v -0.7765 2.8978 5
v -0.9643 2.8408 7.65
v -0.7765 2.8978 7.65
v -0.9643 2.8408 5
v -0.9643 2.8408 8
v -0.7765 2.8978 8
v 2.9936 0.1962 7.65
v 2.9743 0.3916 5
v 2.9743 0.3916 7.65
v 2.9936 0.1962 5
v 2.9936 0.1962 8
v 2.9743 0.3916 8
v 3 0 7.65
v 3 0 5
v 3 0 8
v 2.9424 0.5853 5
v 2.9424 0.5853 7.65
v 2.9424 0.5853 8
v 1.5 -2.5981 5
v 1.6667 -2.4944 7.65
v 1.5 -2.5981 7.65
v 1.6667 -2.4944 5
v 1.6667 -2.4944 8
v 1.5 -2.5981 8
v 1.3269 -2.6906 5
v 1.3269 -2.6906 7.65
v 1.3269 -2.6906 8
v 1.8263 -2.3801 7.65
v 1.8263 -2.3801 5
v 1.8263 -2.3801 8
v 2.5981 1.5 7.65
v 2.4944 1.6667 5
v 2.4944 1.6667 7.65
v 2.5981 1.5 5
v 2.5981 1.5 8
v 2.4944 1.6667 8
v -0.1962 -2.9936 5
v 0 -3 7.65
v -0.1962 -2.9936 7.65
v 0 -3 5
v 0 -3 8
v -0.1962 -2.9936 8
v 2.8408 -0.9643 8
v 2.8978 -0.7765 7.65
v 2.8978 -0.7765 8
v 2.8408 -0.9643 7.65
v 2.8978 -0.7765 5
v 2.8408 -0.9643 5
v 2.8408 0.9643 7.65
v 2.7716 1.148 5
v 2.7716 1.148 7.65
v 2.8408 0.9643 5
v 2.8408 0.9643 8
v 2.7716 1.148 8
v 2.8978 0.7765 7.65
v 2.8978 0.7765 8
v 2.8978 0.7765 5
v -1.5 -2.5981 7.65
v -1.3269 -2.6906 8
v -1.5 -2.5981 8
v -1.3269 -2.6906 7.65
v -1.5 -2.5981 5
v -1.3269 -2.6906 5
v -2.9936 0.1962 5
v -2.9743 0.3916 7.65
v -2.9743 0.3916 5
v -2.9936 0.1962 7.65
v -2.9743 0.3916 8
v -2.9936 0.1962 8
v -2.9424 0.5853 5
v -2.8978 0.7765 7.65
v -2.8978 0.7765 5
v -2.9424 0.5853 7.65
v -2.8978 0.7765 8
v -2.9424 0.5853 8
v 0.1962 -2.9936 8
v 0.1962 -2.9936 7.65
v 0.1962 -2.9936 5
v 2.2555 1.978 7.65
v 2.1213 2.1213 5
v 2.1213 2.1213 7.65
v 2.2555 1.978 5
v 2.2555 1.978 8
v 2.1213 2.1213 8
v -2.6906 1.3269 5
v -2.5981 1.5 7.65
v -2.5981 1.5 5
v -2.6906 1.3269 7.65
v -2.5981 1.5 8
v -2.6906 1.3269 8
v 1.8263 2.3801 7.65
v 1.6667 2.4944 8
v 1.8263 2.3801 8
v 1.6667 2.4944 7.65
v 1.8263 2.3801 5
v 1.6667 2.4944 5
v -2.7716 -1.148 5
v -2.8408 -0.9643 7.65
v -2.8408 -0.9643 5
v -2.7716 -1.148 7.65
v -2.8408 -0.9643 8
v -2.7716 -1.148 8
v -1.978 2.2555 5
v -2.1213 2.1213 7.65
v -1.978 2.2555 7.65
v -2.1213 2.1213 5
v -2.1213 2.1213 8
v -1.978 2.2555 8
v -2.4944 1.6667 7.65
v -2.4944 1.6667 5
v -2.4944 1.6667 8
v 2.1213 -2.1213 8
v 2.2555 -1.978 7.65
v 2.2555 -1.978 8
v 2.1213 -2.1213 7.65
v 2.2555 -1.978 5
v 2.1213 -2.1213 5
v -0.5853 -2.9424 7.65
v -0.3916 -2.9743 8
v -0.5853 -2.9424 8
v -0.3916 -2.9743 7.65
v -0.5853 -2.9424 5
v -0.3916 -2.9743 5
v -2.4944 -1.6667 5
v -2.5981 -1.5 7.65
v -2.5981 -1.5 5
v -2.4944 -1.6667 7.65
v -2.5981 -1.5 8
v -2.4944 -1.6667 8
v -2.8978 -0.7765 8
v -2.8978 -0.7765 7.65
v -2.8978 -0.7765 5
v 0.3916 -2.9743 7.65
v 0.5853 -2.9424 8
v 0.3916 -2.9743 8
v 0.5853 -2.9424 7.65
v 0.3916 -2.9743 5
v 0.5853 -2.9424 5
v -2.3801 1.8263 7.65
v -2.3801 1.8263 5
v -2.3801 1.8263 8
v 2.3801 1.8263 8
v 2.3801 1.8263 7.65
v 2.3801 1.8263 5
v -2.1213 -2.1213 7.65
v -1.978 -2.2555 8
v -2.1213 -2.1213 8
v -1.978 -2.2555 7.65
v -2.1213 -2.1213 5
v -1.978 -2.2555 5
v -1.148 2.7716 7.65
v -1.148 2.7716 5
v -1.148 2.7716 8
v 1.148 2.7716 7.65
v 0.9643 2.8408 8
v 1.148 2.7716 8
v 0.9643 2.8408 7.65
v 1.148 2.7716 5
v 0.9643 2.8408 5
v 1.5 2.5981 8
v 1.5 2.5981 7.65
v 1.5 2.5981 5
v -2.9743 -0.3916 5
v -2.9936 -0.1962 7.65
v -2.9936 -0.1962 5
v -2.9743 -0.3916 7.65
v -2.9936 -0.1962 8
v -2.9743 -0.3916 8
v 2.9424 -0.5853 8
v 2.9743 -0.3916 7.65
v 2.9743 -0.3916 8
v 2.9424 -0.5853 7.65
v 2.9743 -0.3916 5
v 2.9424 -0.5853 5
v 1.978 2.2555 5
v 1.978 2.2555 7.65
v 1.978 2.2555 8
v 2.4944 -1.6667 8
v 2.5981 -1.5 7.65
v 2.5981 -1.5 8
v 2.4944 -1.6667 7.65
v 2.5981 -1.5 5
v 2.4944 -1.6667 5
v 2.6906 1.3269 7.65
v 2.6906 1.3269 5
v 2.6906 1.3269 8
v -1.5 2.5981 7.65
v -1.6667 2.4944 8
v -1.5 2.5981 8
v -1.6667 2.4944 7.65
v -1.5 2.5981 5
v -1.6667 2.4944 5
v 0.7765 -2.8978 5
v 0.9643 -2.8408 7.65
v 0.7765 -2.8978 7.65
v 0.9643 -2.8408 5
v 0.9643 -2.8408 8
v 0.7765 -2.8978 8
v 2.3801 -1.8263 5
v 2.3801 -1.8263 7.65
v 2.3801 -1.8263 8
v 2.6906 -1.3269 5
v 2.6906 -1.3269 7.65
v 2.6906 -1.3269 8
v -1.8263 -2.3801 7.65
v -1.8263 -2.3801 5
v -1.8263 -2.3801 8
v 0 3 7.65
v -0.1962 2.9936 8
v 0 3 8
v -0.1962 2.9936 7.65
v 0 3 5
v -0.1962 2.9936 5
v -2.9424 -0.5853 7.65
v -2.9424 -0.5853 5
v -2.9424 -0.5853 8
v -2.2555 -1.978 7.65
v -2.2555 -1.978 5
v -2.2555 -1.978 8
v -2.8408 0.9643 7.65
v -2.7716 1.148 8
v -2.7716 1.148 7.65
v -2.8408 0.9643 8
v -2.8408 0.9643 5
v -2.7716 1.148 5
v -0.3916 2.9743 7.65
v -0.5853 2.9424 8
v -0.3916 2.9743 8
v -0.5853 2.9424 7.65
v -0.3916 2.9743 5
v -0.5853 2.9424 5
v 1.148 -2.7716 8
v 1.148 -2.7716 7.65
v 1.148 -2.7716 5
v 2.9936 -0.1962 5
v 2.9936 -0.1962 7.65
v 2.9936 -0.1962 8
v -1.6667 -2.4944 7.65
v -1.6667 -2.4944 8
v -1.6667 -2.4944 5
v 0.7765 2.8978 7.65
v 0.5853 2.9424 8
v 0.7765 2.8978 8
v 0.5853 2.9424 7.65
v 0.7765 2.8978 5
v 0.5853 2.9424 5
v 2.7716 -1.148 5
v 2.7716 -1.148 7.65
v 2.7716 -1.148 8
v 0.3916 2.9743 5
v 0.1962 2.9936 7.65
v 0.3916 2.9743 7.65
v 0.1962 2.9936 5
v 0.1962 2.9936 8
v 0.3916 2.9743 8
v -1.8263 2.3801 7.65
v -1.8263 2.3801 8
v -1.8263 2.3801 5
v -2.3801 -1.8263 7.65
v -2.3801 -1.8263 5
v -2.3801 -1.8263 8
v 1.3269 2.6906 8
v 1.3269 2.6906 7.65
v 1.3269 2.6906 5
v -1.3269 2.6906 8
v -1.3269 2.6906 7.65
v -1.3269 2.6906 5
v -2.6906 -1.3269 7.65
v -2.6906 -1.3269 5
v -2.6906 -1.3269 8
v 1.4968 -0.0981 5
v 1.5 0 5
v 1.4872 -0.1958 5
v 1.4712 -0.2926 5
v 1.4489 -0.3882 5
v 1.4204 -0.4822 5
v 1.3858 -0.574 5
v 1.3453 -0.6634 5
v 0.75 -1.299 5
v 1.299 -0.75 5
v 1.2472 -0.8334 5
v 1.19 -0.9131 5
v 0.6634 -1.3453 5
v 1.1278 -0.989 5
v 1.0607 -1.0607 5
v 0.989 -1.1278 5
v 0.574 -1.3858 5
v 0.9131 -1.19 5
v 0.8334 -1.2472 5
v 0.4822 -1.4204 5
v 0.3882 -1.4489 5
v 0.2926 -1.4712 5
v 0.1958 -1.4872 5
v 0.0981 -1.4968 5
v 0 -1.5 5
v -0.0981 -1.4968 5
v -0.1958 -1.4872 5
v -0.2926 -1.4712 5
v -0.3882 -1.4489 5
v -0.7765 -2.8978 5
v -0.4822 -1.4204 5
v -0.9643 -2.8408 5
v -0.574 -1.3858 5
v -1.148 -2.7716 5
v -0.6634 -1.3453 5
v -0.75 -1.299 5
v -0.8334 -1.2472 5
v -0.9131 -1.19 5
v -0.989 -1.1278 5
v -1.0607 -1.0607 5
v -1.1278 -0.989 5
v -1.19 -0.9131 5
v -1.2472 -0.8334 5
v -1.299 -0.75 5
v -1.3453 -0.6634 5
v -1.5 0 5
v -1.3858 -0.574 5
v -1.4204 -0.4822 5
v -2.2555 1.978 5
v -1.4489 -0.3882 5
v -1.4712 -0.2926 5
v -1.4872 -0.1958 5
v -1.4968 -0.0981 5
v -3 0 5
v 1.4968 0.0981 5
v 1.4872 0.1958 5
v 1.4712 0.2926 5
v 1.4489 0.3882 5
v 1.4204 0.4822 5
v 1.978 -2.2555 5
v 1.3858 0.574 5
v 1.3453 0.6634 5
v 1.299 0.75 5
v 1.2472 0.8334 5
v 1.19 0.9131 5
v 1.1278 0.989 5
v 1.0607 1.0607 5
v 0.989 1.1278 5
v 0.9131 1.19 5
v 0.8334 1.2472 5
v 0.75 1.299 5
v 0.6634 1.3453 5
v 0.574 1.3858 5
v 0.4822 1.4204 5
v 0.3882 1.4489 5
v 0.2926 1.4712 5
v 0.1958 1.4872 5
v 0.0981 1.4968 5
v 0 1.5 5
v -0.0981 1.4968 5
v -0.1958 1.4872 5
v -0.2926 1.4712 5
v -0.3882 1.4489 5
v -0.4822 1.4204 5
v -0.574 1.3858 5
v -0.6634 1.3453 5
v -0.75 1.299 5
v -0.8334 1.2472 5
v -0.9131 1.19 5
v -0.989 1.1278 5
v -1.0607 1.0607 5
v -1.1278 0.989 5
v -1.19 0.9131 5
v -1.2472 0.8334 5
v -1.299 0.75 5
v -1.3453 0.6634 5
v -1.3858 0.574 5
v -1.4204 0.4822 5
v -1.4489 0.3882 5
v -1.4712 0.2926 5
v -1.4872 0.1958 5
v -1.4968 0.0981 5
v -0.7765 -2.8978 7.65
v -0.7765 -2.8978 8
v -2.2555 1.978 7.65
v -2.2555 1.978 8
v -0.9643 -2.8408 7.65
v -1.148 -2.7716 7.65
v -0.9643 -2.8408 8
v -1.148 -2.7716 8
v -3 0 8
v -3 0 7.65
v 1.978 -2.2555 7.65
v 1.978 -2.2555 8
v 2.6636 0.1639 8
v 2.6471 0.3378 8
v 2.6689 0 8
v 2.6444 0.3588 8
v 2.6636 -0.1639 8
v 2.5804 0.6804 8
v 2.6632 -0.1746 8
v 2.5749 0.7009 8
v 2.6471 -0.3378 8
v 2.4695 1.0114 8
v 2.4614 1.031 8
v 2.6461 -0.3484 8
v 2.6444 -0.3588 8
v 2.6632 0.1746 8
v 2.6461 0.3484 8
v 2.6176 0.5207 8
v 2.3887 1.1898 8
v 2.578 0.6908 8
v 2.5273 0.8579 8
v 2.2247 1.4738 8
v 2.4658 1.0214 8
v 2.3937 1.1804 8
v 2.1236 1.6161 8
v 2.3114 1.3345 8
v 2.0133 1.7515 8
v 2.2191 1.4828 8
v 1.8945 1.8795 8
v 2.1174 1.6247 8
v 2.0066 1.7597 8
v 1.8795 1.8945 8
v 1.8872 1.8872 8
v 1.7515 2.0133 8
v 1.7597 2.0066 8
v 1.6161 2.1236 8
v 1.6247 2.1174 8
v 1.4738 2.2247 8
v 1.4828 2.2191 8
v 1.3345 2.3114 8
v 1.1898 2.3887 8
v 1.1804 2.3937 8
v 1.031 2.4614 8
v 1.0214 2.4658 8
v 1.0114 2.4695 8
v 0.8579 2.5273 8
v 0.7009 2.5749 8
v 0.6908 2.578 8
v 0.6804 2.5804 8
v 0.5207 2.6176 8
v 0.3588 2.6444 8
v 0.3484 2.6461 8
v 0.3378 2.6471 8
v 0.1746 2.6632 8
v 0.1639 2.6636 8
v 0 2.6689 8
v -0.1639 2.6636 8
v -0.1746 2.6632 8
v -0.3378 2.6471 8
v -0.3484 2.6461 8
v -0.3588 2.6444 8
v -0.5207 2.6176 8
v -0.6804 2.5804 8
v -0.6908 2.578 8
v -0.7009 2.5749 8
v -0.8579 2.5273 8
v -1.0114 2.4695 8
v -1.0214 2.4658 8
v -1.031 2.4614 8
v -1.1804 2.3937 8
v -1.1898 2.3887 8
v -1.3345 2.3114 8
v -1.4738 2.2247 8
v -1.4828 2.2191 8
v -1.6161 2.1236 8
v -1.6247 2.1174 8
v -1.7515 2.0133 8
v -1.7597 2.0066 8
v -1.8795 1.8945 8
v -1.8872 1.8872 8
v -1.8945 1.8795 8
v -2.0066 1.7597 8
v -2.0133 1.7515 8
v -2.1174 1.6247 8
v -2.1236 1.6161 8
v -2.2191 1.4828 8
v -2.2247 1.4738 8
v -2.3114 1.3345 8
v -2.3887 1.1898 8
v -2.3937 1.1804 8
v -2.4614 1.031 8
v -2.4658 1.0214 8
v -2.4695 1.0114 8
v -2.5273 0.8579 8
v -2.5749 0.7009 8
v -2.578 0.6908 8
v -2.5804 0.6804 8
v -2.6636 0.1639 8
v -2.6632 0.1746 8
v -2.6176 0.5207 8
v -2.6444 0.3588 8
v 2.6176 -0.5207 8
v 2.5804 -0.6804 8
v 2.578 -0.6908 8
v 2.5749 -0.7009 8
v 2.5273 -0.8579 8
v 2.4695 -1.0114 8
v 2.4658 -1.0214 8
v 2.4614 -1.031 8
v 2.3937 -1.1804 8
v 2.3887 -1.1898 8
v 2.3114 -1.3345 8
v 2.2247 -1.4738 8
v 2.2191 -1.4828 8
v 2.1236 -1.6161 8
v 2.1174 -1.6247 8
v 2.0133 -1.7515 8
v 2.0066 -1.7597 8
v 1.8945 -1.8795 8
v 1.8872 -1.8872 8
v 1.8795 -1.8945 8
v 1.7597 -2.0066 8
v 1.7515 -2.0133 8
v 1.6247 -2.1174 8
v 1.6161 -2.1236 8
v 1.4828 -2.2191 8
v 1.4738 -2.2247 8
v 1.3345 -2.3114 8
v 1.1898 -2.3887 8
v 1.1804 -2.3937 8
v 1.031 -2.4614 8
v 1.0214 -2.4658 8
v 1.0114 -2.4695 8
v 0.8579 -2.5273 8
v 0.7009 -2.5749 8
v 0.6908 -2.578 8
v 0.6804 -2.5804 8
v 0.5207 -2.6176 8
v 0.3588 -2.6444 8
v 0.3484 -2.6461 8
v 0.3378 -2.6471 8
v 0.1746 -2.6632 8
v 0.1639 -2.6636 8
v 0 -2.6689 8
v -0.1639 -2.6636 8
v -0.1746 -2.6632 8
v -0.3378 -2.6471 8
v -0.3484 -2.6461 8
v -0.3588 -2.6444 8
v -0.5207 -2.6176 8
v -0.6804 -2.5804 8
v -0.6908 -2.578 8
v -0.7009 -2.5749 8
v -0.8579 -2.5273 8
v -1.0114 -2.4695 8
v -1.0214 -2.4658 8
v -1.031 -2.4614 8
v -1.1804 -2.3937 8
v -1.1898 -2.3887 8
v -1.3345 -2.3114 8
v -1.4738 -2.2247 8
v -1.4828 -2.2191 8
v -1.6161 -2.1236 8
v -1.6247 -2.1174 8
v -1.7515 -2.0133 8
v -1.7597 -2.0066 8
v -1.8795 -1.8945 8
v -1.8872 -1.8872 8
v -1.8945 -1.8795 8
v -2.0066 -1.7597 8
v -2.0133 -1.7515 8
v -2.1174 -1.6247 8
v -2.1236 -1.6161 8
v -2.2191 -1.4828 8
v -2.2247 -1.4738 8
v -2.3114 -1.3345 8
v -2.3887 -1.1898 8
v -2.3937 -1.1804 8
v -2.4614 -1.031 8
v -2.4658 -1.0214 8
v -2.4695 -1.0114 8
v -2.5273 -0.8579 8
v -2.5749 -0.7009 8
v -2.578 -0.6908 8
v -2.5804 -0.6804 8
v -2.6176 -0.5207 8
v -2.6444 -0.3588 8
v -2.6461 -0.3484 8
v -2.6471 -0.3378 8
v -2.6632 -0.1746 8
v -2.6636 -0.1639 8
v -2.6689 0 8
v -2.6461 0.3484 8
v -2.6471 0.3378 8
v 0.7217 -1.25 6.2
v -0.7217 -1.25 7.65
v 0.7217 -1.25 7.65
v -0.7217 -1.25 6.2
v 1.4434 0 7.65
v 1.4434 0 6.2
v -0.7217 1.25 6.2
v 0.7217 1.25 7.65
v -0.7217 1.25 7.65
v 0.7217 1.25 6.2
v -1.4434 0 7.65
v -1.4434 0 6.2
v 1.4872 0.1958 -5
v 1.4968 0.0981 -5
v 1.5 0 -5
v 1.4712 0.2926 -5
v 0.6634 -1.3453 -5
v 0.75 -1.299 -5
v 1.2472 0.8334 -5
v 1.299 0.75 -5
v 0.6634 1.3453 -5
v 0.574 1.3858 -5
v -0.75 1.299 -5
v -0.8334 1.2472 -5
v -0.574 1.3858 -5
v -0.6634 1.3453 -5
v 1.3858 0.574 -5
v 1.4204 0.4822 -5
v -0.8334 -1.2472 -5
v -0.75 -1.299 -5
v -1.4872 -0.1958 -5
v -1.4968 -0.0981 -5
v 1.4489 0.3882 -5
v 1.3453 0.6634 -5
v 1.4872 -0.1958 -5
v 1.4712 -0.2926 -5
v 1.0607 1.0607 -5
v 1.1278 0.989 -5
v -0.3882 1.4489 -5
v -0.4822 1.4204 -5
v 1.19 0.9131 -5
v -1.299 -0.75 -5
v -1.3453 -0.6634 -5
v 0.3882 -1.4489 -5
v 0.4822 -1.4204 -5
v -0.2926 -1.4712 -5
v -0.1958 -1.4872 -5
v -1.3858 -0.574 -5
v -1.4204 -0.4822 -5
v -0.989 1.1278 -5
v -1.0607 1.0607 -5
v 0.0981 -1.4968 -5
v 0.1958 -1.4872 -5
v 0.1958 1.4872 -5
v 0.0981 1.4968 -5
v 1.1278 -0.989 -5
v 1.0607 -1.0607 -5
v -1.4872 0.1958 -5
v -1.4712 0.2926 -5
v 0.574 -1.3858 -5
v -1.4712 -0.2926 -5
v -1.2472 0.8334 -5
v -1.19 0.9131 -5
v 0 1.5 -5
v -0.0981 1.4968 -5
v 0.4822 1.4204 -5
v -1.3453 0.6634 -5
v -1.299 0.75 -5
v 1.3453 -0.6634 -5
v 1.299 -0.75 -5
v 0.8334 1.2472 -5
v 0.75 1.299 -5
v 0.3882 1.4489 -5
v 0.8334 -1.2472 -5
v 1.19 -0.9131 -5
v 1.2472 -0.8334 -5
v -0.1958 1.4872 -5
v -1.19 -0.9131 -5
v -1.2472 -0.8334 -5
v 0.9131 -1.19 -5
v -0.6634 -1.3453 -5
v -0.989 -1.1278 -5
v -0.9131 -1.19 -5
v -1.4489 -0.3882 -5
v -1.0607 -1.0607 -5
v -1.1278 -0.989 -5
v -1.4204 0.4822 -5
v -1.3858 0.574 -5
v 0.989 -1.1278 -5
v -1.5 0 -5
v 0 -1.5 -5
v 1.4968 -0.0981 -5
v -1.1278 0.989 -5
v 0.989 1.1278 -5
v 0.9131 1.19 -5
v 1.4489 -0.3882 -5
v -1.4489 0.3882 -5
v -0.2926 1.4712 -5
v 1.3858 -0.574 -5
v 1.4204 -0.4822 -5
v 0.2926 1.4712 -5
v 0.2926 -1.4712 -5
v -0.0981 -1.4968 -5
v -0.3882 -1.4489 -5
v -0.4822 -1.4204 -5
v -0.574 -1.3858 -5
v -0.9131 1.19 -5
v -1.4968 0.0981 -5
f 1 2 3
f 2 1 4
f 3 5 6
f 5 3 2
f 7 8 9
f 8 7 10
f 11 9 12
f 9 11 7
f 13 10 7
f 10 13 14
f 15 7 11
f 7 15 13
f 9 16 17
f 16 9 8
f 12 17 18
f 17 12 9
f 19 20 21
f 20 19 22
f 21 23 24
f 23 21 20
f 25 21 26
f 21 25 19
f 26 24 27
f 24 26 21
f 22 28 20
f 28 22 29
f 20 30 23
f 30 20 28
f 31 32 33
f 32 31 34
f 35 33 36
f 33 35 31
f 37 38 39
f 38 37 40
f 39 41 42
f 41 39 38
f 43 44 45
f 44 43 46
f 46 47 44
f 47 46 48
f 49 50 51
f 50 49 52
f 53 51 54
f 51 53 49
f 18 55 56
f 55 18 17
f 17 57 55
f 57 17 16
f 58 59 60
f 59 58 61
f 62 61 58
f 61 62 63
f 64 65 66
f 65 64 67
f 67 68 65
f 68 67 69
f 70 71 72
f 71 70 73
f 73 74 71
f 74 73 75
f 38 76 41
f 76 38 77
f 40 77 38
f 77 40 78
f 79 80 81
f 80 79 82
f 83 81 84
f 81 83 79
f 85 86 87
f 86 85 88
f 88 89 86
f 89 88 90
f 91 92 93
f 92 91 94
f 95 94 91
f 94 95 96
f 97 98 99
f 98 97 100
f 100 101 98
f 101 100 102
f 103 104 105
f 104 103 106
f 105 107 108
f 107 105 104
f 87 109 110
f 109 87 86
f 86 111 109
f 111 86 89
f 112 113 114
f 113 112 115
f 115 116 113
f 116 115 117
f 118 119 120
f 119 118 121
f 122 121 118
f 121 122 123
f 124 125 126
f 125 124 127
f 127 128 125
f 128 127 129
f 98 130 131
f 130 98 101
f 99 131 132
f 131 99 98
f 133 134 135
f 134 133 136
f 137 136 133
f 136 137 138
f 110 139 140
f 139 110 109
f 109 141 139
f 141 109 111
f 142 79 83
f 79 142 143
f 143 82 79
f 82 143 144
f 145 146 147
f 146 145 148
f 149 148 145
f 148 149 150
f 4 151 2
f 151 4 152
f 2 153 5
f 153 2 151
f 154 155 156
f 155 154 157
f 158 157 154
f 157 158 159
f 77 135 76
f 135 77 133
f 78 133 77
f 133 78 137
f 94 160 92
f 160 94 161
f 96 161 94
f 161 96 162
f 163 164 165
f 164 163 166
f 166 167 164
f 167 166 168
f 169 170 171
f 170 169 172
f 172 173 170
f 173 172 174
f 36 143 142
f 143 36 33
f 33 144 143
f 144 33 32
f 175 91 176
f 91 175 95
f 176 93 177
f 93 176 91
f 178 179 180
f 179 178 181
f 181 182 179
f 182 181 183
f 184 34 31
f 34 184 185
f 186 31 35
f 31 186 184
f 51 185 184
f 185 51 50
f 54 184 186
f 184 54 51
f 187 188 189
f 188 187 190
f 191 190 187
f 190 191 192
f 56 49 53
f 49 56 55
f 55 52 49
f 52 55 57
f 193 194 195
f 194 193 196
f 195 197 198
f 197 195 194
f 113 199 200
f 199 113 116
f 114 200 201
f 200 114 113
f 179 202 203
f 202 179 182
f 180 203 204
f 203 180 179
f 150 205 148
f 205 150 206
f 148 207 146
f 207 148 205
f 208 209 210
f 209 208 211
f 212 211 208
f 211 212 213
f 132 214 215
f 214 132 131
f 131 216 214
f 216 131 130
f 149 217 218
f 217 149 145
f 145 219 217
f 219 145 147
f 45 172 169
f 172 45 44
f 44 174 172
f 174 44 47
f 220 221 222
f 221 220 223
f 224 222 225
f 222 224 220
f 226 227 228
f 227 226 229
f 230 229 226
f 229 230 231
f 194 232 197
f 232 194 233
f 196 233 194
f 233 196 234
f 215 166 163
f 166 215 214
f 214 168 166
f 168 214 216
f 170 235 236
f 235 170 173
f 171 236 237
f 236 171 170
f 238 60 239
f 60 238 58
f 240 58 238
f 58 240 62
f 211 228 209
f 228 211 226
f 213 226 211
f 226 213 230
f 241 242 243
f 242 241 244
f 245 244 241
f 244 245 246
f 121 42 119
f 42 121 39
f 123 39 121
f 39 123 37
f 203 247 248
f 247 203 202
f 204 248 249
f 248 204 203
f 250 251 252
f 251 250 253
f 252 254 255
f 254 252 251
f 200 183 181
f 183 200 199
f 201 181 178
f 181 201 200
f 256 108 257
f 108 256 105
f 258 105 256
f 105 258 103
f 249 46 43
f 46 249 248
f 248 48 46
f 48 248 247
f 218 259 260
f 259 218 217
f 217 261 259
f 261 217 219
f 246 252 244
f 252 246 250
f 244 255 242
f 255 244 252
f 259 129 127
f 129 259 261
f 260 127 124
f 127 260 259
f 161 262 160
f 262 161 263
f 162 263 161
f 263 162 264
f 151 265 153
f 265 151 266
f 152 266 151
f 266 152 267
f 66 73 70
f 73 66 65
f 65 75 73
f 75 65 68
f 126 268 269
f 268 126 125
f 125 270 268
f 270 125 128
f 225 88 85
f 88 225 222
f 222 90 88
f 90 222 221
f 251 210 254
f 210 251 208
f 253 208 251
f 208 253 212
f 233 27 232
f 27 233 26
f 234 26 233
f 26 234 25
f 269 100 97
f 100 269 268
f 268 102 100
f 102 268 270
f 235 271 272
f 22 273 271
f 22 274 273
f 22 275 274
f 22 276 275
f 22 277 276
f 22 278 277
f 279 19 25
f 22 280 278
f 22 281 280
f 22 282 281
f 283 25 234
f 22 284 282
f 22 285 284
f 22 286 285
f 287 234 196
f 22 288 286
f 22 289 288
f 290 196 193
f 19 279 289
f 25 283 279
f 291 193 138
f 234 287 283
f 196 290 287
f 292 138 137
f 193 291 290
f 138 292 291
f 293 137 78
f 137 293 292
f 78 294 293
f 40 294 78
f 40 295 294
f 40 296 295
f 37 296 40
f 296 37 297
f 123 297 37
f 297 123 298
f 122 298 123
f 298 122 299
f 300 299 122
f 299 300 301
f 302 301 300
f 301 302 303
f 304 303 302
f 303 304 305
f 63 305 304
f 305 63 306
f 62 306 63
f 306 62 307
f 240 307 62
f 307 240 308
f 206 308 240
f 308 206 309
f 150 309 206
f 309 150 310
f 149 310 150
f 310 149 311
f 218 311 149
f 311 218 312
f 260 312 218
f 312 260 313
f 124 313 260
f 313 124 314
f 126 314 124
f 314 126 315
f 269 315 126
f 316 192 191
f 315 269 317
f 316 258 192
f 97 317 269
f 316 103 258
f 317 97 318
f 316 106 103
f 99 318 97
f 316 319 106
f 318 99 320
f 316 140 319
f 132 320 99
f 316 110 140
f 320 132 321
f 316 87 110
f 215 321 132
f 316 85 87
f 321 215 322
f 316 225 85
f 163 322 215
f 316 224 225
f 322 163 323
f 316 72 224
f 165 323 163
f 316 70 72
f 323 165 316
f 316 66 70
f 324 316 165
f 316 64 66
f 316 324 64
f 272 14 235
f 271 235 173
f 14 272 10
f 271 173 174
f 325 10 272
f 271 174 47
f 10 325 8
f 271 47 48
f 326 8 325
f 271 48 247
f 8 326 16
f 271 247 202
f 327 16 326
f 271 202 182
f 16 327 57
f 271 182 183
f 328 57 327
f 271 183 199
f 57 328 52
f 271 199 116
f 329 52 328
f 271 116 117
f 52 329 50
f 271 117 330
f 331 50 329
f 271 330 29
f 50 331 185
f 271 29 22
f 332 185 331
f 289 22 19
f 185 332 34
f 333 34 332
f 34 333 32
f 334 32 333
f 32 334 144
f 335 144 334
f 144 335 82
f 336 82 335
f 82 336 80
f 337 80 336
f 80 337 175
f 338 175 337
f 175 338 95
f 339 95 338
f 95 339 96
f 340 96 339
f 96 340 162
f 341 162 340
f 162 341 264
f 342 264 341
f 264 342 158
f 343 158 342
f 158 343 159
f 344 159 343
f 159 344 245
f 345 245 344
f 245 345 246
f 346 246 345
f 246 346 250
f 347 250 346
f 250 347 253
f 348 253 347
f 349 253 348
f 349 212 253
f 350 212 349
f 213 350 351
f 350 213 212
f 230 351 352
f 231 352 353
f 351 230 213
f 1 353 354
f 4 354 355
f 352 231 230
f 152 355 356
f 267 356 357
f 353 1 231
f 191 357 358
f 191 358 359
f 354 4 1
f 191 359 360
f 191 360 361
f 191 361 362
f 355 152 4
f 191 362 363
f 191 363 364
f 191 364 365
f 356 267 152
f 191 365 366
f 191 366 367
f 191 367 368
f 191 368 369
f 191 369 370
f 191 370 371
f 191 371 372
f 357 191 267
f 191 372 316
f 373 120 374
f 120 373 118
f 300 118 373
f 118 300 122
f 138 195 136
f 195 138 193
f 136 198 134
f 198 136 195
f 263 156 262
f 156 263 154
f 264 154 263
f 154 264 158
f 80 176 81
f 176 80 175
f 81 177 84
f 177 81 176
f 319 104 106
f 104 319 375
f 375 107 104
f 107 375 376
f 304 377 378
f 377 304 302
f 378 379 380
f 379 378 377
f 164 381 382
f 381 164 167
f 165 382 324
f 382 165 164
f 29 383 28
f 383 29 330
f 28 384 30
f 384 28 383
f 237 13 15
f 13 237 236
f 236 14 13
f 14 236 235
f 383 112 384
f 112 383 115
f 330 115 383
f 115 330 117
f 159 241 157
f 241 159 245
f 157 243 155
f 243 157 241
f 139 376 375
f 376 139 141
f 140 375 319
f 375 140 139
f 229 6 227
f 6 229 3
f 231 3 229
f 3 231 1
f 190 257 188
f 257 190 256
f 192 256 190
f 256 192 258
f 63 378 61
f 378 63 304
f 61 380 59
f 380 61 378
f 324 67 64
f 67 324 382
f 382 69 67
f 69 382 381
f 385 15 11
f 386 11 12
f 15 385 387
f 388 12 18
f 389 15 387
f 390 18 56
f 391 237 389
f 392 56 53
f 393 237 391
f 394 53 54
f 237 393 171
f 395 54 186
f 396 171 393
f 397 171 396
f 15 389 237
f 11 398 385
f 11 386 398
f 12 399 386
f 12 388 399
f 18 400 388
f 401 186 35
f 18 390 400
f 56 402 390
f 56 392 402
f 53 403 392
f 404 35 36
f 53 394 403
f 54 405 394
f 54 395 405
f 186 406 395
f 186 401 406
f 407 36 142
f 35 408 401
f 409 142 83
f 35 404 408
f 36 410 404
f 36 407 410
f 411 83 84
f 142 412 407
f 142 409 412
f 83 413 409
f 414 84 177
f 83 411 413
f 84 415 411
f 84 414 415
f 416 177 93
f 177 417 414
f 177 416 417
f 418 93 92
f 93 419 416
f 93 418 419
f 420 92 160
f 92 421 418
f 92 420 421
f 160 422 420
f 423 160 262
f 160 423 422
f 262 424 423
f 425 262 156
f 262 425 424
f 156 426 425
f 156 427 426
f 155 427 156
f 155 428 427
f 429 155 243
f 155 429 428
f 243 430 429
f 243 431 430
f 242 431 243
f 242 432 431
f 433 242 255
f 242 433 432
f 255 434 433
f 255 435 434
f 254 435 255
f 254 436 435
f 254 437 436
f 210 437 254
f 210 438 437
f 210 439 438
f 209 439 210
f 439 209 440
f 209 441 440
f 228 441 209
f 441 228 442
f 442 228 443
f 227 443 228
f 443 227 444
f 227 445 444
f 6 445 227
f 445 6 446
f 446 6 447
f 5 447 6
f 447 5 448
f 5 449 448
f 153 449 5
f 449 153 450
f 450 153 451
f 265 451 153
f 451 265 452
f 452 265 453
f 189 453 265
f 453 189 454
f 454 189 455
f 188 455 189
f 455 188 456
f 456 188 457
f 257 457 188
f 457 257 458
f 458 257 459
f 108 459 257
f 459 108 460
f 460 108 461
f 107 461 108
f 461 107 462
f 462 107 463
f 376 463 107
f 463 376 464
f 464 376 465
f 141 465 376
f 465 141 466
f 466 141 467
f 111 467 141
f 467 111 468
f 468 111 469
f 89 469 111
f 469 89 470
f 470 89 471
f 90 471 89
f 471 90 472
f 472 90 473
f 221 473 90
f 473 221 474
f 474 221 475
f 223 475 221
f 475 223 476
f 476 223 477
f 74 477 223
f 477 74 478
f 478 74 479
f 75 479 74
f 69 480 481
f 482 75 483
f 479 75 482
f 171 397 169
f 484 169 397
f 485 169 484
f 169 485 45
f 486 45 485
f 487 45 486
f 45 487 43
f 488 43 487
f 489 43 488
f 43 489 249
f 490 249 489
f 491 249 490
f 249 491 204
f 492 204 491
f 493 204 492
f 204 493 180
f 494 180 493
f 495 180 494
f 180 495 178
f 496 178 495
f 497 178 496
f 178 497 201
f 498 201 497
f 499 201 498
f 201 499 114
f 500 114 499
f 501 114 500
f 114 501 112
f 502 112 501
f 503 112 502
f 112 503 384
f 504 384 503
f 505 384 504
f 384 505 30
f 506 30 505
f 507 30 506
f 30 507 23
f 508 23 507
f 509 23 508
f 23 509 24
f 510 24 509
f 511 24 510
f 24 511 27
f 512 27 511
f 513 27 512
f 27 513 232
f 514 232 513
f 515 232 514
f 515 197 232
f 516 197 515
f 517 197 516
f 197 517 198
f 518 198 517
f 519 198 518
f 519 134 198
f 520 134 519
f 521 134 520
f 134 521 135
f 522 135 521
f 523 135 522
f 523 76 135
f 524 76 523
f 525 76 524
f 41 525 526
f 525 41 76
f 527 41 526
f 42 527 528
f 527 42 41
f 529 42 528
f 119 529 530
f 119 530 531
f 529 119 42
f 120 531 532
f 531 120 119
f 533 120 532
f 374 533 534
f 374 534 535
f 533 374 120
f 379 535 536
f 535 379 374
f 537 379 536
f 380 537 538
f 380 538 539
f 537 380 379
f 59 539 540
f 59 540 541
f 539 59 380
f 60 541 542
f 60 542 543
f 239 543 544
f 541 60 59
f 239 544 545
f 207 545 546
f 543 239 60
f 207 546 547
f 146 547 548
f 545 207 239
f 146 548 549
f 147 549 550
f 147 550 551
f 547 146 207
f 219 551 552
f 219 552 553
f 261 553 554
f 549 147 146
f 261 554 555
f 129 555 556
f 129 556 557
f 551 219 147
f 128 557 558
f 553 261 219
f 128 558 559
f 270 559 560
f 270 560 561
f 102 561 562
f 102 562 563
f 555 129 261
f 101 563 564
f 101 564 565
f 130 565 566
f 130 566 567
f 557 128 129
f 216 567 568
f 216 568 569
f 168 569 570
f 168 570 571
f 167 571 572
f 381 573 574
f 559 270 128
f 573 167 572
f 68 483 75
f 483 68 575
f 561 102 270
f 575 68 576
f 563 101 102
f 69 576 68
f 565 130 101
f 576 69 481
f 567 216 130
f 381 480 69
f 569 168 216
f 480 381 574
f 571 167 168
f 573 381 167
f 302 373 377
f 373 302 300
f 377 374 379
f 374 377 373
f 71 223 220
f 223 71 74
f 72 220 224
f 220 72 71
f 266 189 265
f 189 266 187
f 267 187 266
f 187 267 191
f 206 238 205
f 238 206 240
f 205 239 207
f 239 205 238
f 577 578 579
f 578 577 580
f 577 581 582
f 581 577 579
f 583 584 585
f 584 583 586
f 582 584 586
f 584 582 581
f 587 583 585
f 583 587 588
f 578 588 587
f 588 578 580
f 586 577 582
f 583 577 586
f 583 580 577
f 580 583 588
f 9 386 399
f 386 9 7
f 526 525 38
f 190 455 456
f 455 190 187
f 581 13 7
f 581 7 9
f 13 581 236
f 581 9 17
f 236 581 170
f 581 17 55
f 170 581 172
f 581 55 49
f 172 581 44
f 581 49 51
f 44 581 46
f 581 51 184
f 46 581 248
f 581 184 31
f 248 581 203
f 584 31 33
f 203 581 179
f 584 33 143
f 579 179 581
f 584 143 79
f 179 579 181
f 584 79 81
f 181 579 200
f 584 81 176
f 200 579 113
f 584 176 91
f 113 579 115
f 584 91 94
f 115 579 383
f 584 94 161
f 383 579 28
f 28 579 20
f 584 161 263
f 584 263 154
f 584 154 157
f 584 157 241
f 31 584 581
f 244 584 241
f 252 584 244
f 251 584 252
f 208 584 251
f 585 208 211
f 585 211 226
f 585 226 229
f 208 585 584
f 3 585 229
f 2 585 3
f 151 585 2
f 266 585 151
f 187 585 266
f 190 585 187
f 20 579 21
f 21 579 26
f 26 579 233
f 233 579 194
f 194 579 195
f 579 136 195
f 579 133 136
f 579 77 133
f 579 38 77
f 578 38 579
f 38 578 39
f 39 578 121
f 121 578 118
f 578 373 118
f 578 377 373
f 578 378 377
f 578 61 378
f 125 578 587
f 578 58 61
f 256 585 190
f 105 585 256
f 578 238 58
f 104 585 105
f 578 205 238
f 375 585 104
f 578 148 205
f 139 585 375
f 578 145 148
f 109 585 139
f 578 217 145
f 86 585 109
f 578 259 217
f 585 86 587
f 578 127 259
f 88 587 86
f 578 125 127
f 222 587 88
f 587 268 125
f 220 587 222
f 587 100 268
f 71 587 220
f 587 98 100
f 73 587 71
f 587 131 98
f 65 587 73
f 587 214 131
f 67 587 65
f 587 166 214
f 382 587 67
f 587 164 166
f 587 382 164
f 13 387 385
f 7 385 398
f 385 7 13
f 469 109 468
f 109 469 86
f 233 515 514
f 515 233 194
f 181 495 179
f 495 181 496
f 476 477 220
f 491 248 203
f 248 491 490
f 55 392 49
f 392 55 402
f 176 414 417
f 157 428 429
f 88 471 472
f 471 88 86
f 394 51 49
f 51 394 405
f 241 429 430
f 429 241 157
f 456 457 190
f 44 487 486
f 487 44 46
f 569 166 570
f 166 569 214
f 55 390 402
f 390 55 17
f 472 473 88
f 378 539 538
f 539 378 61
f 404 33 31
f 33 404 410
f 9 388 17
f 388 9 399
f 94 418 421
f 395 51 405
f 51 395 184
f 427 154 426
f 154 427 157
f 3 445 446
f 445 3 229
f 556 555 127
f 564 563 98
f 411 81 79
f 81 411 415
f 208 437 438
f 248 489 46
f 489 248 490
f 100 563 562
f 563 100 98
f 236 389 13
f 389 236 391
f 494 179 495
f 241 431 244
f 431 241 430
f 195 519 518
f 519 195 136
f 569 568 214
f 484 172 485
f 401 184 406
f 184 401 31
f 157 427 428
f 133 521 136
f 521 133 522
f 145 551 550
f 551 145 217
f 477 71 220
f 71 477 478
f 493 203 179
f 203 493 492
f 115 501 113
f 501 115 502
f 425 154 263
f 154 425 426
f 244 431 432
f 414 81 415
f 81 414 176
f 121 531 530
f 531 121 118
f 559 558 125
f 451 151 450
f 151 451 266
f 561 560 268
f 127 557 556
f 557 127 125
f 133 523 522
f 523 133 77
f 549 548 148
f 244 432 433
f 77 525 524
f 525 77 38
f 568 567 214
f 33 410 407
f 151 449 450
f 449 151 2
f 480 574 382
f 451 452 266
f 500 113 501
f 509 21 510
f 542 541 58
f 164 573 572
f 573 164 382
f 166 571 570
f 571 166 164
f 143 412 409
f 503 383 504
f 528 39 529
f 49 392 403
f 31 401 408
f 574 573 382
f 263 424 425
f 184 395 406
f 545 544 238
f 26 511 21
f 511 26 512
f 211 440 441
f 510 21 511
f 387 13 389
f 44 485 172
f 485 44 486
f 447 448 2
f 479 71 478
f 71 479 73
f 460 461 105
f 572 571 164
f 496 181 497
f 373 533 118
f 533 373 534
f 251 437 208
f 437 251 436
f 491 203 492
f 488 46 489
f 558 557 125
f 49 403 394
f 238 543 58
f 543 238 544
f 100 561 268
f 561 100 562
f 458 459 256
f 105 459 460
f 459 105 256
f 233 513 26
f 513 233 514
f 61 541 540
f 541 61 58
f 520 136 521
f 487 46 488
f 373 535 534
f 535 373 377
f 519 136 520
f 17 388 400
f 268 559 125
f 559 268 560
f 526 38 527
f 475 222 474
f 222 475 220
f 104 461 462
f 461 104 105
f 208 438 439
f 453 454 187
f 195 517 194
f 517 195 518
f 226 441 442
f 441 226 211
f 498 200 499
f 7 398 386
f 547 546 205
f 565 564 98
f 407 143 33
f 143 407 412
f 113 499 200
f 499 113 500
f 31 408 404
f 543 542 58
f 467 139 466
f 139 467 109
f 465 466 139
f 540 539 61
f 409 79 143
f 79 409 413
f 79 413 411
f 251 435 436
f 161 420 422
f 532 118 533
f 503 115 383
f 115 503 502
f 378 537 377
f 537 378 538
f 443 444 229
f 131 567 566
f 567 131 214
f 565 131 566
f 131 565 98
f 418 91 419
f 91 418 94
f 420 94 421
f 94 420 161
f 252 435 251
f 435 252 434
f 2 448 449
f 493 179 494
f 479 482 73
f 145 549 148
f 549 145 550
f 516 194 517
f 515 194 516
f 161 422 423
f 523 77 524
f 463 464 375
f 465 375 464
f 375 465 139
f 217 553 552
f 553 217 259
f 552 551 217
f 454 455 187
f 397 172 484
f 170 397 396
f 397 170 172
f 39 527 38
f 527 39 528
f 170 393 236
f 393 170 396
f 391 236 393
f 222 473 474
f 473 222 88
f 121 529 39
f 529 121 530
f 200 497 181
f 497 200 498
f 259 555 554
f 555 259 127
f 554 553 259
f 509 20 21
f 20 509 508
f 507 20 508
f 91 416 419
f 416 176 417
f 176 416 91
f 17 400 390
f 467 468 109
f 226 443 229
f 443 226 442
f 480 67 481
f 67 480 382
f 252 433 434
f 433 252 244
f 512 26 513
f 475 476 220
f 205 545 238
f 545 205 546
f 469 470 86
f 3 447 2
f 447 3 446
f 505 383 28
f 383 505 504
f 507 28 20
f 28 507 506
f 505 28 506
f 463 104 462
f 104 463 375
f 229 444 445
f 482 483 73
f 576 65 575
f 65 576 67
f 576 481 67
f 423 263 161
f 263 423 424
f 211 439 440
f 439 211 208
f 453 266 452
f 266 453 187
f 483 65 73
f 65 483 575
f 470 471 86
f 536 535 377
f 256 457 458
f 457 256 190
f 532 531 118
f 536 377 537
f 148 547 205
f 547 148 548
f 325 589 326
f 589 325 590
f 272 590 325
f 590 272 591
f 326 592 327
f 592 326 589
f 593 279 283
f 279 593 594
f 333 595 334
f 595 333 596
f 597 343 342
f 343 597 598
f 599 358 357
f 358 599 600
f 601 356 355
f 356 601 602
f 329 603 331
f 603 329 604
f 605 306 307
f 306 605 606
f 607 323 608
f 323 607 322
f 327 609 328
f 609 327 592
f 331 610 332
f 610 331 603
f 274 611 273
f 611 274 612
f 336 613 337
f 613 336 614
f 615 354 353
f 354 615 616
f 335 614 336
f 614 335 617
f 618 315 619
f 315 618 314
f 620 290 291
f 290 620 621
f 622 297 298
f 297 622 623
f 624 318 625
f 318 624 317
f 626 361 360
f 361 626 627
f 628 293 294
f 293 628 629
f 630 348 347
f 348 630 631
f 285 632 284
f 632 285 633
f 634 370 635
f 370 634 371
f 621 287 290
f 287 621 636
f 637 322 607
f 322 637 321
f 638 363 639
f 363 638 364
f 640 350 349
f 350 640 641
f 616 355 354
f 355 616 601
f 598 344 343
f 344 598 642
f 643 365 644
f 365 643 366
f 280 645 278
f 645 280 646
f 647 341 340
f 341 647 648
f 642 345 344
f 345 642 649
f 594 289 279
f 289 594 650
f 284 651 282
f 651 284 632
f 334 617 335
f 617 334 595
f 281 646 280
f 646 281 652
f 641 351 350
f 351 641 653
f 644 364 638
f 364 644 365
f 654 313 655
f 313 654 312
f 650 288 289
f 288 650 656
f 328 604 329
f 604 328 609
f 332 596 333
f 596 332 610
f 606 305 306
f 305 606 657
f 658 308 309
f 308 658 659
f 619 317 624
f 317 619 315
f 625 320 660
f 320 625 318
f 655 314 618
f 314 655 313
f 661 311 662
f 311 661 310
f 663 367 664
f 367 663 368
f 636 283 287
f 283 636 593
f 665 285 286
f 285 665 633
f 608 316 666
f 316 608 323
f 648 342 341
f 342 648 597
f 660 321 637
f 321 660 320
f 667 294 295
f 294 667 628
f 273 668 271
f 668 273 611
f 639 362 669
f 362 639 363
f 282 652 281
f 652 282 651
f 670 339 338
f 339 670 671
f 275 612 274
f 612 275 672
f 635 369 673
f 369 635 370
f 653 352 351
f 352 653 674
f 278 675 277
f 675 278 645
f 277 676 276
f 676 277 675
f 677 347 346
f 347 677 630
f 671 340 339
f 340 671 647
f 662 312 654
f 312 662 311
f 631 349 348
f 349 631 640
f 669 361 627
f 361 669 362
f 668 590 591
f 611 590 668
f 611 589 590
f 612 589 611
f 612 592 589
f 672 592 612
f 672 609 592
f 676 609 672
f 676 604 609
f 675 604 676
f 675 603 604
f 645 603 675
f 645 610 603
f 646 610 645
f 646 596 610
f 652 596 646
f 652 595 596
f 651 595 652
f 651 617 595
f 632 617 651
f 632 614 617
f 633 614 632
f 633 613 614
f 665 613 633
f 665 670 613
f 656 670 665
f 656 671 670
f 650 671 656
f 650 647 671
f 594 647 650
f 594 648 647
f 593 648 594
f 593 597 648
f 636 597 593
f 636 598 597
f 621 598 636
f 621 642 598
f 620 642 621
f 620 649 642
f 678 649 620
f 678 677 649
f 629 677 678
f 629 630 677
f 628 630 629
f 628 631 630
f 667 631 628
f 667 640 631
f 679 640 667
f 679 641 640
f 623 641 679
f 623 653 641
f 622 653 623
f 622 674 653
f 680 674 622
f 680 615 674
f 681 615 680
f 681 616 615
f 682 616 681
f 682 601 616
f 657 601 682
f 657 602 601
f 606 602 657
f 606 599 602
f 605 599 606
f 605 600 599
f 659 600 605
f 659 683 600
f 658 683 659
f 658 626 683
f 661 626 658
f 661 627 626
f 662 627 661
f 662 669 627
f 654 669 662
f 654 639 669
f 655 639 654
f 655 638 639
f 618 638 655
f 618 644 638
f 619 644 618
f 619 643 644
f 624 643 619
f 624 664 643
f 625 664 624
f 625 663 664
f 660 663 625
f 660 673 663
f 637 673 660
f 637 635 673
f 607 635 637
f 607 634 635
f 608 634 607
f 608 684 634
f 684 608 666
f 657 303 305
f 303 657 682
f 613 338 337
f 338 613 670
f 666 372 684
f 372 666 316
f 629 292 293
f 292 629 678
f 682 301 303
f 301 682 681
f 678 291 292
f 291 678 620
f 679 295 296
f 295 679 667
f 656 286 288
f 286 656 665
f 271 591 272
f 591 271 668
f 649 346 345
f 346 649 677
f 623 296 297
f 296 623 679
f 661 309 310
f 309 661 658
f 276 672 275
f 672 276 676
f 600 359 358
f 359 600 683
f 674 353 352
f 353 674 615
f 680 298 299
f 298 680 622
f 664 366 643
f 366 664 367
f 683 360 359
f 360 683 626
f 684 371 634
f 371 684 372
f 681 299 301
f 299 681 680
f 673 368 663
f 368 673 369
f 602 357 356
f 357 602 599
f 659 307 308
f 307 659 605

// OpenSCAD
$fn=96;

module socket_head_cap_screw(d=3.0, L=10.0, head_d=6.0, head_h=3.0, hex_flat=2.5, hex_depth=1.8, chamfer=0.35) {
    union() {
        translate([0,0,-L/2])
            cylinder(h=L, d=d);

        translate([0,0,L/2])
        difference() {
            cylinder(h=head_h, d=head_d);

            translate([0,0,head_h-hex_depth])
                cylinder(h=hex_depth+0.02, d=hex_flat / cos(30), $fn=6);

            translate([0,0,head_h-chamfer])
                cylinder(h=chamfer+0.02, d1=head_d, d2=head_d-2*chamfer);
        }
    }
}

socket_head_cap_screw(d=3.0, L=10.0, head_d=6.0, head_h=3.0, hex_flat=2.5, hex_depth=1.8, chamfer=0.35);
